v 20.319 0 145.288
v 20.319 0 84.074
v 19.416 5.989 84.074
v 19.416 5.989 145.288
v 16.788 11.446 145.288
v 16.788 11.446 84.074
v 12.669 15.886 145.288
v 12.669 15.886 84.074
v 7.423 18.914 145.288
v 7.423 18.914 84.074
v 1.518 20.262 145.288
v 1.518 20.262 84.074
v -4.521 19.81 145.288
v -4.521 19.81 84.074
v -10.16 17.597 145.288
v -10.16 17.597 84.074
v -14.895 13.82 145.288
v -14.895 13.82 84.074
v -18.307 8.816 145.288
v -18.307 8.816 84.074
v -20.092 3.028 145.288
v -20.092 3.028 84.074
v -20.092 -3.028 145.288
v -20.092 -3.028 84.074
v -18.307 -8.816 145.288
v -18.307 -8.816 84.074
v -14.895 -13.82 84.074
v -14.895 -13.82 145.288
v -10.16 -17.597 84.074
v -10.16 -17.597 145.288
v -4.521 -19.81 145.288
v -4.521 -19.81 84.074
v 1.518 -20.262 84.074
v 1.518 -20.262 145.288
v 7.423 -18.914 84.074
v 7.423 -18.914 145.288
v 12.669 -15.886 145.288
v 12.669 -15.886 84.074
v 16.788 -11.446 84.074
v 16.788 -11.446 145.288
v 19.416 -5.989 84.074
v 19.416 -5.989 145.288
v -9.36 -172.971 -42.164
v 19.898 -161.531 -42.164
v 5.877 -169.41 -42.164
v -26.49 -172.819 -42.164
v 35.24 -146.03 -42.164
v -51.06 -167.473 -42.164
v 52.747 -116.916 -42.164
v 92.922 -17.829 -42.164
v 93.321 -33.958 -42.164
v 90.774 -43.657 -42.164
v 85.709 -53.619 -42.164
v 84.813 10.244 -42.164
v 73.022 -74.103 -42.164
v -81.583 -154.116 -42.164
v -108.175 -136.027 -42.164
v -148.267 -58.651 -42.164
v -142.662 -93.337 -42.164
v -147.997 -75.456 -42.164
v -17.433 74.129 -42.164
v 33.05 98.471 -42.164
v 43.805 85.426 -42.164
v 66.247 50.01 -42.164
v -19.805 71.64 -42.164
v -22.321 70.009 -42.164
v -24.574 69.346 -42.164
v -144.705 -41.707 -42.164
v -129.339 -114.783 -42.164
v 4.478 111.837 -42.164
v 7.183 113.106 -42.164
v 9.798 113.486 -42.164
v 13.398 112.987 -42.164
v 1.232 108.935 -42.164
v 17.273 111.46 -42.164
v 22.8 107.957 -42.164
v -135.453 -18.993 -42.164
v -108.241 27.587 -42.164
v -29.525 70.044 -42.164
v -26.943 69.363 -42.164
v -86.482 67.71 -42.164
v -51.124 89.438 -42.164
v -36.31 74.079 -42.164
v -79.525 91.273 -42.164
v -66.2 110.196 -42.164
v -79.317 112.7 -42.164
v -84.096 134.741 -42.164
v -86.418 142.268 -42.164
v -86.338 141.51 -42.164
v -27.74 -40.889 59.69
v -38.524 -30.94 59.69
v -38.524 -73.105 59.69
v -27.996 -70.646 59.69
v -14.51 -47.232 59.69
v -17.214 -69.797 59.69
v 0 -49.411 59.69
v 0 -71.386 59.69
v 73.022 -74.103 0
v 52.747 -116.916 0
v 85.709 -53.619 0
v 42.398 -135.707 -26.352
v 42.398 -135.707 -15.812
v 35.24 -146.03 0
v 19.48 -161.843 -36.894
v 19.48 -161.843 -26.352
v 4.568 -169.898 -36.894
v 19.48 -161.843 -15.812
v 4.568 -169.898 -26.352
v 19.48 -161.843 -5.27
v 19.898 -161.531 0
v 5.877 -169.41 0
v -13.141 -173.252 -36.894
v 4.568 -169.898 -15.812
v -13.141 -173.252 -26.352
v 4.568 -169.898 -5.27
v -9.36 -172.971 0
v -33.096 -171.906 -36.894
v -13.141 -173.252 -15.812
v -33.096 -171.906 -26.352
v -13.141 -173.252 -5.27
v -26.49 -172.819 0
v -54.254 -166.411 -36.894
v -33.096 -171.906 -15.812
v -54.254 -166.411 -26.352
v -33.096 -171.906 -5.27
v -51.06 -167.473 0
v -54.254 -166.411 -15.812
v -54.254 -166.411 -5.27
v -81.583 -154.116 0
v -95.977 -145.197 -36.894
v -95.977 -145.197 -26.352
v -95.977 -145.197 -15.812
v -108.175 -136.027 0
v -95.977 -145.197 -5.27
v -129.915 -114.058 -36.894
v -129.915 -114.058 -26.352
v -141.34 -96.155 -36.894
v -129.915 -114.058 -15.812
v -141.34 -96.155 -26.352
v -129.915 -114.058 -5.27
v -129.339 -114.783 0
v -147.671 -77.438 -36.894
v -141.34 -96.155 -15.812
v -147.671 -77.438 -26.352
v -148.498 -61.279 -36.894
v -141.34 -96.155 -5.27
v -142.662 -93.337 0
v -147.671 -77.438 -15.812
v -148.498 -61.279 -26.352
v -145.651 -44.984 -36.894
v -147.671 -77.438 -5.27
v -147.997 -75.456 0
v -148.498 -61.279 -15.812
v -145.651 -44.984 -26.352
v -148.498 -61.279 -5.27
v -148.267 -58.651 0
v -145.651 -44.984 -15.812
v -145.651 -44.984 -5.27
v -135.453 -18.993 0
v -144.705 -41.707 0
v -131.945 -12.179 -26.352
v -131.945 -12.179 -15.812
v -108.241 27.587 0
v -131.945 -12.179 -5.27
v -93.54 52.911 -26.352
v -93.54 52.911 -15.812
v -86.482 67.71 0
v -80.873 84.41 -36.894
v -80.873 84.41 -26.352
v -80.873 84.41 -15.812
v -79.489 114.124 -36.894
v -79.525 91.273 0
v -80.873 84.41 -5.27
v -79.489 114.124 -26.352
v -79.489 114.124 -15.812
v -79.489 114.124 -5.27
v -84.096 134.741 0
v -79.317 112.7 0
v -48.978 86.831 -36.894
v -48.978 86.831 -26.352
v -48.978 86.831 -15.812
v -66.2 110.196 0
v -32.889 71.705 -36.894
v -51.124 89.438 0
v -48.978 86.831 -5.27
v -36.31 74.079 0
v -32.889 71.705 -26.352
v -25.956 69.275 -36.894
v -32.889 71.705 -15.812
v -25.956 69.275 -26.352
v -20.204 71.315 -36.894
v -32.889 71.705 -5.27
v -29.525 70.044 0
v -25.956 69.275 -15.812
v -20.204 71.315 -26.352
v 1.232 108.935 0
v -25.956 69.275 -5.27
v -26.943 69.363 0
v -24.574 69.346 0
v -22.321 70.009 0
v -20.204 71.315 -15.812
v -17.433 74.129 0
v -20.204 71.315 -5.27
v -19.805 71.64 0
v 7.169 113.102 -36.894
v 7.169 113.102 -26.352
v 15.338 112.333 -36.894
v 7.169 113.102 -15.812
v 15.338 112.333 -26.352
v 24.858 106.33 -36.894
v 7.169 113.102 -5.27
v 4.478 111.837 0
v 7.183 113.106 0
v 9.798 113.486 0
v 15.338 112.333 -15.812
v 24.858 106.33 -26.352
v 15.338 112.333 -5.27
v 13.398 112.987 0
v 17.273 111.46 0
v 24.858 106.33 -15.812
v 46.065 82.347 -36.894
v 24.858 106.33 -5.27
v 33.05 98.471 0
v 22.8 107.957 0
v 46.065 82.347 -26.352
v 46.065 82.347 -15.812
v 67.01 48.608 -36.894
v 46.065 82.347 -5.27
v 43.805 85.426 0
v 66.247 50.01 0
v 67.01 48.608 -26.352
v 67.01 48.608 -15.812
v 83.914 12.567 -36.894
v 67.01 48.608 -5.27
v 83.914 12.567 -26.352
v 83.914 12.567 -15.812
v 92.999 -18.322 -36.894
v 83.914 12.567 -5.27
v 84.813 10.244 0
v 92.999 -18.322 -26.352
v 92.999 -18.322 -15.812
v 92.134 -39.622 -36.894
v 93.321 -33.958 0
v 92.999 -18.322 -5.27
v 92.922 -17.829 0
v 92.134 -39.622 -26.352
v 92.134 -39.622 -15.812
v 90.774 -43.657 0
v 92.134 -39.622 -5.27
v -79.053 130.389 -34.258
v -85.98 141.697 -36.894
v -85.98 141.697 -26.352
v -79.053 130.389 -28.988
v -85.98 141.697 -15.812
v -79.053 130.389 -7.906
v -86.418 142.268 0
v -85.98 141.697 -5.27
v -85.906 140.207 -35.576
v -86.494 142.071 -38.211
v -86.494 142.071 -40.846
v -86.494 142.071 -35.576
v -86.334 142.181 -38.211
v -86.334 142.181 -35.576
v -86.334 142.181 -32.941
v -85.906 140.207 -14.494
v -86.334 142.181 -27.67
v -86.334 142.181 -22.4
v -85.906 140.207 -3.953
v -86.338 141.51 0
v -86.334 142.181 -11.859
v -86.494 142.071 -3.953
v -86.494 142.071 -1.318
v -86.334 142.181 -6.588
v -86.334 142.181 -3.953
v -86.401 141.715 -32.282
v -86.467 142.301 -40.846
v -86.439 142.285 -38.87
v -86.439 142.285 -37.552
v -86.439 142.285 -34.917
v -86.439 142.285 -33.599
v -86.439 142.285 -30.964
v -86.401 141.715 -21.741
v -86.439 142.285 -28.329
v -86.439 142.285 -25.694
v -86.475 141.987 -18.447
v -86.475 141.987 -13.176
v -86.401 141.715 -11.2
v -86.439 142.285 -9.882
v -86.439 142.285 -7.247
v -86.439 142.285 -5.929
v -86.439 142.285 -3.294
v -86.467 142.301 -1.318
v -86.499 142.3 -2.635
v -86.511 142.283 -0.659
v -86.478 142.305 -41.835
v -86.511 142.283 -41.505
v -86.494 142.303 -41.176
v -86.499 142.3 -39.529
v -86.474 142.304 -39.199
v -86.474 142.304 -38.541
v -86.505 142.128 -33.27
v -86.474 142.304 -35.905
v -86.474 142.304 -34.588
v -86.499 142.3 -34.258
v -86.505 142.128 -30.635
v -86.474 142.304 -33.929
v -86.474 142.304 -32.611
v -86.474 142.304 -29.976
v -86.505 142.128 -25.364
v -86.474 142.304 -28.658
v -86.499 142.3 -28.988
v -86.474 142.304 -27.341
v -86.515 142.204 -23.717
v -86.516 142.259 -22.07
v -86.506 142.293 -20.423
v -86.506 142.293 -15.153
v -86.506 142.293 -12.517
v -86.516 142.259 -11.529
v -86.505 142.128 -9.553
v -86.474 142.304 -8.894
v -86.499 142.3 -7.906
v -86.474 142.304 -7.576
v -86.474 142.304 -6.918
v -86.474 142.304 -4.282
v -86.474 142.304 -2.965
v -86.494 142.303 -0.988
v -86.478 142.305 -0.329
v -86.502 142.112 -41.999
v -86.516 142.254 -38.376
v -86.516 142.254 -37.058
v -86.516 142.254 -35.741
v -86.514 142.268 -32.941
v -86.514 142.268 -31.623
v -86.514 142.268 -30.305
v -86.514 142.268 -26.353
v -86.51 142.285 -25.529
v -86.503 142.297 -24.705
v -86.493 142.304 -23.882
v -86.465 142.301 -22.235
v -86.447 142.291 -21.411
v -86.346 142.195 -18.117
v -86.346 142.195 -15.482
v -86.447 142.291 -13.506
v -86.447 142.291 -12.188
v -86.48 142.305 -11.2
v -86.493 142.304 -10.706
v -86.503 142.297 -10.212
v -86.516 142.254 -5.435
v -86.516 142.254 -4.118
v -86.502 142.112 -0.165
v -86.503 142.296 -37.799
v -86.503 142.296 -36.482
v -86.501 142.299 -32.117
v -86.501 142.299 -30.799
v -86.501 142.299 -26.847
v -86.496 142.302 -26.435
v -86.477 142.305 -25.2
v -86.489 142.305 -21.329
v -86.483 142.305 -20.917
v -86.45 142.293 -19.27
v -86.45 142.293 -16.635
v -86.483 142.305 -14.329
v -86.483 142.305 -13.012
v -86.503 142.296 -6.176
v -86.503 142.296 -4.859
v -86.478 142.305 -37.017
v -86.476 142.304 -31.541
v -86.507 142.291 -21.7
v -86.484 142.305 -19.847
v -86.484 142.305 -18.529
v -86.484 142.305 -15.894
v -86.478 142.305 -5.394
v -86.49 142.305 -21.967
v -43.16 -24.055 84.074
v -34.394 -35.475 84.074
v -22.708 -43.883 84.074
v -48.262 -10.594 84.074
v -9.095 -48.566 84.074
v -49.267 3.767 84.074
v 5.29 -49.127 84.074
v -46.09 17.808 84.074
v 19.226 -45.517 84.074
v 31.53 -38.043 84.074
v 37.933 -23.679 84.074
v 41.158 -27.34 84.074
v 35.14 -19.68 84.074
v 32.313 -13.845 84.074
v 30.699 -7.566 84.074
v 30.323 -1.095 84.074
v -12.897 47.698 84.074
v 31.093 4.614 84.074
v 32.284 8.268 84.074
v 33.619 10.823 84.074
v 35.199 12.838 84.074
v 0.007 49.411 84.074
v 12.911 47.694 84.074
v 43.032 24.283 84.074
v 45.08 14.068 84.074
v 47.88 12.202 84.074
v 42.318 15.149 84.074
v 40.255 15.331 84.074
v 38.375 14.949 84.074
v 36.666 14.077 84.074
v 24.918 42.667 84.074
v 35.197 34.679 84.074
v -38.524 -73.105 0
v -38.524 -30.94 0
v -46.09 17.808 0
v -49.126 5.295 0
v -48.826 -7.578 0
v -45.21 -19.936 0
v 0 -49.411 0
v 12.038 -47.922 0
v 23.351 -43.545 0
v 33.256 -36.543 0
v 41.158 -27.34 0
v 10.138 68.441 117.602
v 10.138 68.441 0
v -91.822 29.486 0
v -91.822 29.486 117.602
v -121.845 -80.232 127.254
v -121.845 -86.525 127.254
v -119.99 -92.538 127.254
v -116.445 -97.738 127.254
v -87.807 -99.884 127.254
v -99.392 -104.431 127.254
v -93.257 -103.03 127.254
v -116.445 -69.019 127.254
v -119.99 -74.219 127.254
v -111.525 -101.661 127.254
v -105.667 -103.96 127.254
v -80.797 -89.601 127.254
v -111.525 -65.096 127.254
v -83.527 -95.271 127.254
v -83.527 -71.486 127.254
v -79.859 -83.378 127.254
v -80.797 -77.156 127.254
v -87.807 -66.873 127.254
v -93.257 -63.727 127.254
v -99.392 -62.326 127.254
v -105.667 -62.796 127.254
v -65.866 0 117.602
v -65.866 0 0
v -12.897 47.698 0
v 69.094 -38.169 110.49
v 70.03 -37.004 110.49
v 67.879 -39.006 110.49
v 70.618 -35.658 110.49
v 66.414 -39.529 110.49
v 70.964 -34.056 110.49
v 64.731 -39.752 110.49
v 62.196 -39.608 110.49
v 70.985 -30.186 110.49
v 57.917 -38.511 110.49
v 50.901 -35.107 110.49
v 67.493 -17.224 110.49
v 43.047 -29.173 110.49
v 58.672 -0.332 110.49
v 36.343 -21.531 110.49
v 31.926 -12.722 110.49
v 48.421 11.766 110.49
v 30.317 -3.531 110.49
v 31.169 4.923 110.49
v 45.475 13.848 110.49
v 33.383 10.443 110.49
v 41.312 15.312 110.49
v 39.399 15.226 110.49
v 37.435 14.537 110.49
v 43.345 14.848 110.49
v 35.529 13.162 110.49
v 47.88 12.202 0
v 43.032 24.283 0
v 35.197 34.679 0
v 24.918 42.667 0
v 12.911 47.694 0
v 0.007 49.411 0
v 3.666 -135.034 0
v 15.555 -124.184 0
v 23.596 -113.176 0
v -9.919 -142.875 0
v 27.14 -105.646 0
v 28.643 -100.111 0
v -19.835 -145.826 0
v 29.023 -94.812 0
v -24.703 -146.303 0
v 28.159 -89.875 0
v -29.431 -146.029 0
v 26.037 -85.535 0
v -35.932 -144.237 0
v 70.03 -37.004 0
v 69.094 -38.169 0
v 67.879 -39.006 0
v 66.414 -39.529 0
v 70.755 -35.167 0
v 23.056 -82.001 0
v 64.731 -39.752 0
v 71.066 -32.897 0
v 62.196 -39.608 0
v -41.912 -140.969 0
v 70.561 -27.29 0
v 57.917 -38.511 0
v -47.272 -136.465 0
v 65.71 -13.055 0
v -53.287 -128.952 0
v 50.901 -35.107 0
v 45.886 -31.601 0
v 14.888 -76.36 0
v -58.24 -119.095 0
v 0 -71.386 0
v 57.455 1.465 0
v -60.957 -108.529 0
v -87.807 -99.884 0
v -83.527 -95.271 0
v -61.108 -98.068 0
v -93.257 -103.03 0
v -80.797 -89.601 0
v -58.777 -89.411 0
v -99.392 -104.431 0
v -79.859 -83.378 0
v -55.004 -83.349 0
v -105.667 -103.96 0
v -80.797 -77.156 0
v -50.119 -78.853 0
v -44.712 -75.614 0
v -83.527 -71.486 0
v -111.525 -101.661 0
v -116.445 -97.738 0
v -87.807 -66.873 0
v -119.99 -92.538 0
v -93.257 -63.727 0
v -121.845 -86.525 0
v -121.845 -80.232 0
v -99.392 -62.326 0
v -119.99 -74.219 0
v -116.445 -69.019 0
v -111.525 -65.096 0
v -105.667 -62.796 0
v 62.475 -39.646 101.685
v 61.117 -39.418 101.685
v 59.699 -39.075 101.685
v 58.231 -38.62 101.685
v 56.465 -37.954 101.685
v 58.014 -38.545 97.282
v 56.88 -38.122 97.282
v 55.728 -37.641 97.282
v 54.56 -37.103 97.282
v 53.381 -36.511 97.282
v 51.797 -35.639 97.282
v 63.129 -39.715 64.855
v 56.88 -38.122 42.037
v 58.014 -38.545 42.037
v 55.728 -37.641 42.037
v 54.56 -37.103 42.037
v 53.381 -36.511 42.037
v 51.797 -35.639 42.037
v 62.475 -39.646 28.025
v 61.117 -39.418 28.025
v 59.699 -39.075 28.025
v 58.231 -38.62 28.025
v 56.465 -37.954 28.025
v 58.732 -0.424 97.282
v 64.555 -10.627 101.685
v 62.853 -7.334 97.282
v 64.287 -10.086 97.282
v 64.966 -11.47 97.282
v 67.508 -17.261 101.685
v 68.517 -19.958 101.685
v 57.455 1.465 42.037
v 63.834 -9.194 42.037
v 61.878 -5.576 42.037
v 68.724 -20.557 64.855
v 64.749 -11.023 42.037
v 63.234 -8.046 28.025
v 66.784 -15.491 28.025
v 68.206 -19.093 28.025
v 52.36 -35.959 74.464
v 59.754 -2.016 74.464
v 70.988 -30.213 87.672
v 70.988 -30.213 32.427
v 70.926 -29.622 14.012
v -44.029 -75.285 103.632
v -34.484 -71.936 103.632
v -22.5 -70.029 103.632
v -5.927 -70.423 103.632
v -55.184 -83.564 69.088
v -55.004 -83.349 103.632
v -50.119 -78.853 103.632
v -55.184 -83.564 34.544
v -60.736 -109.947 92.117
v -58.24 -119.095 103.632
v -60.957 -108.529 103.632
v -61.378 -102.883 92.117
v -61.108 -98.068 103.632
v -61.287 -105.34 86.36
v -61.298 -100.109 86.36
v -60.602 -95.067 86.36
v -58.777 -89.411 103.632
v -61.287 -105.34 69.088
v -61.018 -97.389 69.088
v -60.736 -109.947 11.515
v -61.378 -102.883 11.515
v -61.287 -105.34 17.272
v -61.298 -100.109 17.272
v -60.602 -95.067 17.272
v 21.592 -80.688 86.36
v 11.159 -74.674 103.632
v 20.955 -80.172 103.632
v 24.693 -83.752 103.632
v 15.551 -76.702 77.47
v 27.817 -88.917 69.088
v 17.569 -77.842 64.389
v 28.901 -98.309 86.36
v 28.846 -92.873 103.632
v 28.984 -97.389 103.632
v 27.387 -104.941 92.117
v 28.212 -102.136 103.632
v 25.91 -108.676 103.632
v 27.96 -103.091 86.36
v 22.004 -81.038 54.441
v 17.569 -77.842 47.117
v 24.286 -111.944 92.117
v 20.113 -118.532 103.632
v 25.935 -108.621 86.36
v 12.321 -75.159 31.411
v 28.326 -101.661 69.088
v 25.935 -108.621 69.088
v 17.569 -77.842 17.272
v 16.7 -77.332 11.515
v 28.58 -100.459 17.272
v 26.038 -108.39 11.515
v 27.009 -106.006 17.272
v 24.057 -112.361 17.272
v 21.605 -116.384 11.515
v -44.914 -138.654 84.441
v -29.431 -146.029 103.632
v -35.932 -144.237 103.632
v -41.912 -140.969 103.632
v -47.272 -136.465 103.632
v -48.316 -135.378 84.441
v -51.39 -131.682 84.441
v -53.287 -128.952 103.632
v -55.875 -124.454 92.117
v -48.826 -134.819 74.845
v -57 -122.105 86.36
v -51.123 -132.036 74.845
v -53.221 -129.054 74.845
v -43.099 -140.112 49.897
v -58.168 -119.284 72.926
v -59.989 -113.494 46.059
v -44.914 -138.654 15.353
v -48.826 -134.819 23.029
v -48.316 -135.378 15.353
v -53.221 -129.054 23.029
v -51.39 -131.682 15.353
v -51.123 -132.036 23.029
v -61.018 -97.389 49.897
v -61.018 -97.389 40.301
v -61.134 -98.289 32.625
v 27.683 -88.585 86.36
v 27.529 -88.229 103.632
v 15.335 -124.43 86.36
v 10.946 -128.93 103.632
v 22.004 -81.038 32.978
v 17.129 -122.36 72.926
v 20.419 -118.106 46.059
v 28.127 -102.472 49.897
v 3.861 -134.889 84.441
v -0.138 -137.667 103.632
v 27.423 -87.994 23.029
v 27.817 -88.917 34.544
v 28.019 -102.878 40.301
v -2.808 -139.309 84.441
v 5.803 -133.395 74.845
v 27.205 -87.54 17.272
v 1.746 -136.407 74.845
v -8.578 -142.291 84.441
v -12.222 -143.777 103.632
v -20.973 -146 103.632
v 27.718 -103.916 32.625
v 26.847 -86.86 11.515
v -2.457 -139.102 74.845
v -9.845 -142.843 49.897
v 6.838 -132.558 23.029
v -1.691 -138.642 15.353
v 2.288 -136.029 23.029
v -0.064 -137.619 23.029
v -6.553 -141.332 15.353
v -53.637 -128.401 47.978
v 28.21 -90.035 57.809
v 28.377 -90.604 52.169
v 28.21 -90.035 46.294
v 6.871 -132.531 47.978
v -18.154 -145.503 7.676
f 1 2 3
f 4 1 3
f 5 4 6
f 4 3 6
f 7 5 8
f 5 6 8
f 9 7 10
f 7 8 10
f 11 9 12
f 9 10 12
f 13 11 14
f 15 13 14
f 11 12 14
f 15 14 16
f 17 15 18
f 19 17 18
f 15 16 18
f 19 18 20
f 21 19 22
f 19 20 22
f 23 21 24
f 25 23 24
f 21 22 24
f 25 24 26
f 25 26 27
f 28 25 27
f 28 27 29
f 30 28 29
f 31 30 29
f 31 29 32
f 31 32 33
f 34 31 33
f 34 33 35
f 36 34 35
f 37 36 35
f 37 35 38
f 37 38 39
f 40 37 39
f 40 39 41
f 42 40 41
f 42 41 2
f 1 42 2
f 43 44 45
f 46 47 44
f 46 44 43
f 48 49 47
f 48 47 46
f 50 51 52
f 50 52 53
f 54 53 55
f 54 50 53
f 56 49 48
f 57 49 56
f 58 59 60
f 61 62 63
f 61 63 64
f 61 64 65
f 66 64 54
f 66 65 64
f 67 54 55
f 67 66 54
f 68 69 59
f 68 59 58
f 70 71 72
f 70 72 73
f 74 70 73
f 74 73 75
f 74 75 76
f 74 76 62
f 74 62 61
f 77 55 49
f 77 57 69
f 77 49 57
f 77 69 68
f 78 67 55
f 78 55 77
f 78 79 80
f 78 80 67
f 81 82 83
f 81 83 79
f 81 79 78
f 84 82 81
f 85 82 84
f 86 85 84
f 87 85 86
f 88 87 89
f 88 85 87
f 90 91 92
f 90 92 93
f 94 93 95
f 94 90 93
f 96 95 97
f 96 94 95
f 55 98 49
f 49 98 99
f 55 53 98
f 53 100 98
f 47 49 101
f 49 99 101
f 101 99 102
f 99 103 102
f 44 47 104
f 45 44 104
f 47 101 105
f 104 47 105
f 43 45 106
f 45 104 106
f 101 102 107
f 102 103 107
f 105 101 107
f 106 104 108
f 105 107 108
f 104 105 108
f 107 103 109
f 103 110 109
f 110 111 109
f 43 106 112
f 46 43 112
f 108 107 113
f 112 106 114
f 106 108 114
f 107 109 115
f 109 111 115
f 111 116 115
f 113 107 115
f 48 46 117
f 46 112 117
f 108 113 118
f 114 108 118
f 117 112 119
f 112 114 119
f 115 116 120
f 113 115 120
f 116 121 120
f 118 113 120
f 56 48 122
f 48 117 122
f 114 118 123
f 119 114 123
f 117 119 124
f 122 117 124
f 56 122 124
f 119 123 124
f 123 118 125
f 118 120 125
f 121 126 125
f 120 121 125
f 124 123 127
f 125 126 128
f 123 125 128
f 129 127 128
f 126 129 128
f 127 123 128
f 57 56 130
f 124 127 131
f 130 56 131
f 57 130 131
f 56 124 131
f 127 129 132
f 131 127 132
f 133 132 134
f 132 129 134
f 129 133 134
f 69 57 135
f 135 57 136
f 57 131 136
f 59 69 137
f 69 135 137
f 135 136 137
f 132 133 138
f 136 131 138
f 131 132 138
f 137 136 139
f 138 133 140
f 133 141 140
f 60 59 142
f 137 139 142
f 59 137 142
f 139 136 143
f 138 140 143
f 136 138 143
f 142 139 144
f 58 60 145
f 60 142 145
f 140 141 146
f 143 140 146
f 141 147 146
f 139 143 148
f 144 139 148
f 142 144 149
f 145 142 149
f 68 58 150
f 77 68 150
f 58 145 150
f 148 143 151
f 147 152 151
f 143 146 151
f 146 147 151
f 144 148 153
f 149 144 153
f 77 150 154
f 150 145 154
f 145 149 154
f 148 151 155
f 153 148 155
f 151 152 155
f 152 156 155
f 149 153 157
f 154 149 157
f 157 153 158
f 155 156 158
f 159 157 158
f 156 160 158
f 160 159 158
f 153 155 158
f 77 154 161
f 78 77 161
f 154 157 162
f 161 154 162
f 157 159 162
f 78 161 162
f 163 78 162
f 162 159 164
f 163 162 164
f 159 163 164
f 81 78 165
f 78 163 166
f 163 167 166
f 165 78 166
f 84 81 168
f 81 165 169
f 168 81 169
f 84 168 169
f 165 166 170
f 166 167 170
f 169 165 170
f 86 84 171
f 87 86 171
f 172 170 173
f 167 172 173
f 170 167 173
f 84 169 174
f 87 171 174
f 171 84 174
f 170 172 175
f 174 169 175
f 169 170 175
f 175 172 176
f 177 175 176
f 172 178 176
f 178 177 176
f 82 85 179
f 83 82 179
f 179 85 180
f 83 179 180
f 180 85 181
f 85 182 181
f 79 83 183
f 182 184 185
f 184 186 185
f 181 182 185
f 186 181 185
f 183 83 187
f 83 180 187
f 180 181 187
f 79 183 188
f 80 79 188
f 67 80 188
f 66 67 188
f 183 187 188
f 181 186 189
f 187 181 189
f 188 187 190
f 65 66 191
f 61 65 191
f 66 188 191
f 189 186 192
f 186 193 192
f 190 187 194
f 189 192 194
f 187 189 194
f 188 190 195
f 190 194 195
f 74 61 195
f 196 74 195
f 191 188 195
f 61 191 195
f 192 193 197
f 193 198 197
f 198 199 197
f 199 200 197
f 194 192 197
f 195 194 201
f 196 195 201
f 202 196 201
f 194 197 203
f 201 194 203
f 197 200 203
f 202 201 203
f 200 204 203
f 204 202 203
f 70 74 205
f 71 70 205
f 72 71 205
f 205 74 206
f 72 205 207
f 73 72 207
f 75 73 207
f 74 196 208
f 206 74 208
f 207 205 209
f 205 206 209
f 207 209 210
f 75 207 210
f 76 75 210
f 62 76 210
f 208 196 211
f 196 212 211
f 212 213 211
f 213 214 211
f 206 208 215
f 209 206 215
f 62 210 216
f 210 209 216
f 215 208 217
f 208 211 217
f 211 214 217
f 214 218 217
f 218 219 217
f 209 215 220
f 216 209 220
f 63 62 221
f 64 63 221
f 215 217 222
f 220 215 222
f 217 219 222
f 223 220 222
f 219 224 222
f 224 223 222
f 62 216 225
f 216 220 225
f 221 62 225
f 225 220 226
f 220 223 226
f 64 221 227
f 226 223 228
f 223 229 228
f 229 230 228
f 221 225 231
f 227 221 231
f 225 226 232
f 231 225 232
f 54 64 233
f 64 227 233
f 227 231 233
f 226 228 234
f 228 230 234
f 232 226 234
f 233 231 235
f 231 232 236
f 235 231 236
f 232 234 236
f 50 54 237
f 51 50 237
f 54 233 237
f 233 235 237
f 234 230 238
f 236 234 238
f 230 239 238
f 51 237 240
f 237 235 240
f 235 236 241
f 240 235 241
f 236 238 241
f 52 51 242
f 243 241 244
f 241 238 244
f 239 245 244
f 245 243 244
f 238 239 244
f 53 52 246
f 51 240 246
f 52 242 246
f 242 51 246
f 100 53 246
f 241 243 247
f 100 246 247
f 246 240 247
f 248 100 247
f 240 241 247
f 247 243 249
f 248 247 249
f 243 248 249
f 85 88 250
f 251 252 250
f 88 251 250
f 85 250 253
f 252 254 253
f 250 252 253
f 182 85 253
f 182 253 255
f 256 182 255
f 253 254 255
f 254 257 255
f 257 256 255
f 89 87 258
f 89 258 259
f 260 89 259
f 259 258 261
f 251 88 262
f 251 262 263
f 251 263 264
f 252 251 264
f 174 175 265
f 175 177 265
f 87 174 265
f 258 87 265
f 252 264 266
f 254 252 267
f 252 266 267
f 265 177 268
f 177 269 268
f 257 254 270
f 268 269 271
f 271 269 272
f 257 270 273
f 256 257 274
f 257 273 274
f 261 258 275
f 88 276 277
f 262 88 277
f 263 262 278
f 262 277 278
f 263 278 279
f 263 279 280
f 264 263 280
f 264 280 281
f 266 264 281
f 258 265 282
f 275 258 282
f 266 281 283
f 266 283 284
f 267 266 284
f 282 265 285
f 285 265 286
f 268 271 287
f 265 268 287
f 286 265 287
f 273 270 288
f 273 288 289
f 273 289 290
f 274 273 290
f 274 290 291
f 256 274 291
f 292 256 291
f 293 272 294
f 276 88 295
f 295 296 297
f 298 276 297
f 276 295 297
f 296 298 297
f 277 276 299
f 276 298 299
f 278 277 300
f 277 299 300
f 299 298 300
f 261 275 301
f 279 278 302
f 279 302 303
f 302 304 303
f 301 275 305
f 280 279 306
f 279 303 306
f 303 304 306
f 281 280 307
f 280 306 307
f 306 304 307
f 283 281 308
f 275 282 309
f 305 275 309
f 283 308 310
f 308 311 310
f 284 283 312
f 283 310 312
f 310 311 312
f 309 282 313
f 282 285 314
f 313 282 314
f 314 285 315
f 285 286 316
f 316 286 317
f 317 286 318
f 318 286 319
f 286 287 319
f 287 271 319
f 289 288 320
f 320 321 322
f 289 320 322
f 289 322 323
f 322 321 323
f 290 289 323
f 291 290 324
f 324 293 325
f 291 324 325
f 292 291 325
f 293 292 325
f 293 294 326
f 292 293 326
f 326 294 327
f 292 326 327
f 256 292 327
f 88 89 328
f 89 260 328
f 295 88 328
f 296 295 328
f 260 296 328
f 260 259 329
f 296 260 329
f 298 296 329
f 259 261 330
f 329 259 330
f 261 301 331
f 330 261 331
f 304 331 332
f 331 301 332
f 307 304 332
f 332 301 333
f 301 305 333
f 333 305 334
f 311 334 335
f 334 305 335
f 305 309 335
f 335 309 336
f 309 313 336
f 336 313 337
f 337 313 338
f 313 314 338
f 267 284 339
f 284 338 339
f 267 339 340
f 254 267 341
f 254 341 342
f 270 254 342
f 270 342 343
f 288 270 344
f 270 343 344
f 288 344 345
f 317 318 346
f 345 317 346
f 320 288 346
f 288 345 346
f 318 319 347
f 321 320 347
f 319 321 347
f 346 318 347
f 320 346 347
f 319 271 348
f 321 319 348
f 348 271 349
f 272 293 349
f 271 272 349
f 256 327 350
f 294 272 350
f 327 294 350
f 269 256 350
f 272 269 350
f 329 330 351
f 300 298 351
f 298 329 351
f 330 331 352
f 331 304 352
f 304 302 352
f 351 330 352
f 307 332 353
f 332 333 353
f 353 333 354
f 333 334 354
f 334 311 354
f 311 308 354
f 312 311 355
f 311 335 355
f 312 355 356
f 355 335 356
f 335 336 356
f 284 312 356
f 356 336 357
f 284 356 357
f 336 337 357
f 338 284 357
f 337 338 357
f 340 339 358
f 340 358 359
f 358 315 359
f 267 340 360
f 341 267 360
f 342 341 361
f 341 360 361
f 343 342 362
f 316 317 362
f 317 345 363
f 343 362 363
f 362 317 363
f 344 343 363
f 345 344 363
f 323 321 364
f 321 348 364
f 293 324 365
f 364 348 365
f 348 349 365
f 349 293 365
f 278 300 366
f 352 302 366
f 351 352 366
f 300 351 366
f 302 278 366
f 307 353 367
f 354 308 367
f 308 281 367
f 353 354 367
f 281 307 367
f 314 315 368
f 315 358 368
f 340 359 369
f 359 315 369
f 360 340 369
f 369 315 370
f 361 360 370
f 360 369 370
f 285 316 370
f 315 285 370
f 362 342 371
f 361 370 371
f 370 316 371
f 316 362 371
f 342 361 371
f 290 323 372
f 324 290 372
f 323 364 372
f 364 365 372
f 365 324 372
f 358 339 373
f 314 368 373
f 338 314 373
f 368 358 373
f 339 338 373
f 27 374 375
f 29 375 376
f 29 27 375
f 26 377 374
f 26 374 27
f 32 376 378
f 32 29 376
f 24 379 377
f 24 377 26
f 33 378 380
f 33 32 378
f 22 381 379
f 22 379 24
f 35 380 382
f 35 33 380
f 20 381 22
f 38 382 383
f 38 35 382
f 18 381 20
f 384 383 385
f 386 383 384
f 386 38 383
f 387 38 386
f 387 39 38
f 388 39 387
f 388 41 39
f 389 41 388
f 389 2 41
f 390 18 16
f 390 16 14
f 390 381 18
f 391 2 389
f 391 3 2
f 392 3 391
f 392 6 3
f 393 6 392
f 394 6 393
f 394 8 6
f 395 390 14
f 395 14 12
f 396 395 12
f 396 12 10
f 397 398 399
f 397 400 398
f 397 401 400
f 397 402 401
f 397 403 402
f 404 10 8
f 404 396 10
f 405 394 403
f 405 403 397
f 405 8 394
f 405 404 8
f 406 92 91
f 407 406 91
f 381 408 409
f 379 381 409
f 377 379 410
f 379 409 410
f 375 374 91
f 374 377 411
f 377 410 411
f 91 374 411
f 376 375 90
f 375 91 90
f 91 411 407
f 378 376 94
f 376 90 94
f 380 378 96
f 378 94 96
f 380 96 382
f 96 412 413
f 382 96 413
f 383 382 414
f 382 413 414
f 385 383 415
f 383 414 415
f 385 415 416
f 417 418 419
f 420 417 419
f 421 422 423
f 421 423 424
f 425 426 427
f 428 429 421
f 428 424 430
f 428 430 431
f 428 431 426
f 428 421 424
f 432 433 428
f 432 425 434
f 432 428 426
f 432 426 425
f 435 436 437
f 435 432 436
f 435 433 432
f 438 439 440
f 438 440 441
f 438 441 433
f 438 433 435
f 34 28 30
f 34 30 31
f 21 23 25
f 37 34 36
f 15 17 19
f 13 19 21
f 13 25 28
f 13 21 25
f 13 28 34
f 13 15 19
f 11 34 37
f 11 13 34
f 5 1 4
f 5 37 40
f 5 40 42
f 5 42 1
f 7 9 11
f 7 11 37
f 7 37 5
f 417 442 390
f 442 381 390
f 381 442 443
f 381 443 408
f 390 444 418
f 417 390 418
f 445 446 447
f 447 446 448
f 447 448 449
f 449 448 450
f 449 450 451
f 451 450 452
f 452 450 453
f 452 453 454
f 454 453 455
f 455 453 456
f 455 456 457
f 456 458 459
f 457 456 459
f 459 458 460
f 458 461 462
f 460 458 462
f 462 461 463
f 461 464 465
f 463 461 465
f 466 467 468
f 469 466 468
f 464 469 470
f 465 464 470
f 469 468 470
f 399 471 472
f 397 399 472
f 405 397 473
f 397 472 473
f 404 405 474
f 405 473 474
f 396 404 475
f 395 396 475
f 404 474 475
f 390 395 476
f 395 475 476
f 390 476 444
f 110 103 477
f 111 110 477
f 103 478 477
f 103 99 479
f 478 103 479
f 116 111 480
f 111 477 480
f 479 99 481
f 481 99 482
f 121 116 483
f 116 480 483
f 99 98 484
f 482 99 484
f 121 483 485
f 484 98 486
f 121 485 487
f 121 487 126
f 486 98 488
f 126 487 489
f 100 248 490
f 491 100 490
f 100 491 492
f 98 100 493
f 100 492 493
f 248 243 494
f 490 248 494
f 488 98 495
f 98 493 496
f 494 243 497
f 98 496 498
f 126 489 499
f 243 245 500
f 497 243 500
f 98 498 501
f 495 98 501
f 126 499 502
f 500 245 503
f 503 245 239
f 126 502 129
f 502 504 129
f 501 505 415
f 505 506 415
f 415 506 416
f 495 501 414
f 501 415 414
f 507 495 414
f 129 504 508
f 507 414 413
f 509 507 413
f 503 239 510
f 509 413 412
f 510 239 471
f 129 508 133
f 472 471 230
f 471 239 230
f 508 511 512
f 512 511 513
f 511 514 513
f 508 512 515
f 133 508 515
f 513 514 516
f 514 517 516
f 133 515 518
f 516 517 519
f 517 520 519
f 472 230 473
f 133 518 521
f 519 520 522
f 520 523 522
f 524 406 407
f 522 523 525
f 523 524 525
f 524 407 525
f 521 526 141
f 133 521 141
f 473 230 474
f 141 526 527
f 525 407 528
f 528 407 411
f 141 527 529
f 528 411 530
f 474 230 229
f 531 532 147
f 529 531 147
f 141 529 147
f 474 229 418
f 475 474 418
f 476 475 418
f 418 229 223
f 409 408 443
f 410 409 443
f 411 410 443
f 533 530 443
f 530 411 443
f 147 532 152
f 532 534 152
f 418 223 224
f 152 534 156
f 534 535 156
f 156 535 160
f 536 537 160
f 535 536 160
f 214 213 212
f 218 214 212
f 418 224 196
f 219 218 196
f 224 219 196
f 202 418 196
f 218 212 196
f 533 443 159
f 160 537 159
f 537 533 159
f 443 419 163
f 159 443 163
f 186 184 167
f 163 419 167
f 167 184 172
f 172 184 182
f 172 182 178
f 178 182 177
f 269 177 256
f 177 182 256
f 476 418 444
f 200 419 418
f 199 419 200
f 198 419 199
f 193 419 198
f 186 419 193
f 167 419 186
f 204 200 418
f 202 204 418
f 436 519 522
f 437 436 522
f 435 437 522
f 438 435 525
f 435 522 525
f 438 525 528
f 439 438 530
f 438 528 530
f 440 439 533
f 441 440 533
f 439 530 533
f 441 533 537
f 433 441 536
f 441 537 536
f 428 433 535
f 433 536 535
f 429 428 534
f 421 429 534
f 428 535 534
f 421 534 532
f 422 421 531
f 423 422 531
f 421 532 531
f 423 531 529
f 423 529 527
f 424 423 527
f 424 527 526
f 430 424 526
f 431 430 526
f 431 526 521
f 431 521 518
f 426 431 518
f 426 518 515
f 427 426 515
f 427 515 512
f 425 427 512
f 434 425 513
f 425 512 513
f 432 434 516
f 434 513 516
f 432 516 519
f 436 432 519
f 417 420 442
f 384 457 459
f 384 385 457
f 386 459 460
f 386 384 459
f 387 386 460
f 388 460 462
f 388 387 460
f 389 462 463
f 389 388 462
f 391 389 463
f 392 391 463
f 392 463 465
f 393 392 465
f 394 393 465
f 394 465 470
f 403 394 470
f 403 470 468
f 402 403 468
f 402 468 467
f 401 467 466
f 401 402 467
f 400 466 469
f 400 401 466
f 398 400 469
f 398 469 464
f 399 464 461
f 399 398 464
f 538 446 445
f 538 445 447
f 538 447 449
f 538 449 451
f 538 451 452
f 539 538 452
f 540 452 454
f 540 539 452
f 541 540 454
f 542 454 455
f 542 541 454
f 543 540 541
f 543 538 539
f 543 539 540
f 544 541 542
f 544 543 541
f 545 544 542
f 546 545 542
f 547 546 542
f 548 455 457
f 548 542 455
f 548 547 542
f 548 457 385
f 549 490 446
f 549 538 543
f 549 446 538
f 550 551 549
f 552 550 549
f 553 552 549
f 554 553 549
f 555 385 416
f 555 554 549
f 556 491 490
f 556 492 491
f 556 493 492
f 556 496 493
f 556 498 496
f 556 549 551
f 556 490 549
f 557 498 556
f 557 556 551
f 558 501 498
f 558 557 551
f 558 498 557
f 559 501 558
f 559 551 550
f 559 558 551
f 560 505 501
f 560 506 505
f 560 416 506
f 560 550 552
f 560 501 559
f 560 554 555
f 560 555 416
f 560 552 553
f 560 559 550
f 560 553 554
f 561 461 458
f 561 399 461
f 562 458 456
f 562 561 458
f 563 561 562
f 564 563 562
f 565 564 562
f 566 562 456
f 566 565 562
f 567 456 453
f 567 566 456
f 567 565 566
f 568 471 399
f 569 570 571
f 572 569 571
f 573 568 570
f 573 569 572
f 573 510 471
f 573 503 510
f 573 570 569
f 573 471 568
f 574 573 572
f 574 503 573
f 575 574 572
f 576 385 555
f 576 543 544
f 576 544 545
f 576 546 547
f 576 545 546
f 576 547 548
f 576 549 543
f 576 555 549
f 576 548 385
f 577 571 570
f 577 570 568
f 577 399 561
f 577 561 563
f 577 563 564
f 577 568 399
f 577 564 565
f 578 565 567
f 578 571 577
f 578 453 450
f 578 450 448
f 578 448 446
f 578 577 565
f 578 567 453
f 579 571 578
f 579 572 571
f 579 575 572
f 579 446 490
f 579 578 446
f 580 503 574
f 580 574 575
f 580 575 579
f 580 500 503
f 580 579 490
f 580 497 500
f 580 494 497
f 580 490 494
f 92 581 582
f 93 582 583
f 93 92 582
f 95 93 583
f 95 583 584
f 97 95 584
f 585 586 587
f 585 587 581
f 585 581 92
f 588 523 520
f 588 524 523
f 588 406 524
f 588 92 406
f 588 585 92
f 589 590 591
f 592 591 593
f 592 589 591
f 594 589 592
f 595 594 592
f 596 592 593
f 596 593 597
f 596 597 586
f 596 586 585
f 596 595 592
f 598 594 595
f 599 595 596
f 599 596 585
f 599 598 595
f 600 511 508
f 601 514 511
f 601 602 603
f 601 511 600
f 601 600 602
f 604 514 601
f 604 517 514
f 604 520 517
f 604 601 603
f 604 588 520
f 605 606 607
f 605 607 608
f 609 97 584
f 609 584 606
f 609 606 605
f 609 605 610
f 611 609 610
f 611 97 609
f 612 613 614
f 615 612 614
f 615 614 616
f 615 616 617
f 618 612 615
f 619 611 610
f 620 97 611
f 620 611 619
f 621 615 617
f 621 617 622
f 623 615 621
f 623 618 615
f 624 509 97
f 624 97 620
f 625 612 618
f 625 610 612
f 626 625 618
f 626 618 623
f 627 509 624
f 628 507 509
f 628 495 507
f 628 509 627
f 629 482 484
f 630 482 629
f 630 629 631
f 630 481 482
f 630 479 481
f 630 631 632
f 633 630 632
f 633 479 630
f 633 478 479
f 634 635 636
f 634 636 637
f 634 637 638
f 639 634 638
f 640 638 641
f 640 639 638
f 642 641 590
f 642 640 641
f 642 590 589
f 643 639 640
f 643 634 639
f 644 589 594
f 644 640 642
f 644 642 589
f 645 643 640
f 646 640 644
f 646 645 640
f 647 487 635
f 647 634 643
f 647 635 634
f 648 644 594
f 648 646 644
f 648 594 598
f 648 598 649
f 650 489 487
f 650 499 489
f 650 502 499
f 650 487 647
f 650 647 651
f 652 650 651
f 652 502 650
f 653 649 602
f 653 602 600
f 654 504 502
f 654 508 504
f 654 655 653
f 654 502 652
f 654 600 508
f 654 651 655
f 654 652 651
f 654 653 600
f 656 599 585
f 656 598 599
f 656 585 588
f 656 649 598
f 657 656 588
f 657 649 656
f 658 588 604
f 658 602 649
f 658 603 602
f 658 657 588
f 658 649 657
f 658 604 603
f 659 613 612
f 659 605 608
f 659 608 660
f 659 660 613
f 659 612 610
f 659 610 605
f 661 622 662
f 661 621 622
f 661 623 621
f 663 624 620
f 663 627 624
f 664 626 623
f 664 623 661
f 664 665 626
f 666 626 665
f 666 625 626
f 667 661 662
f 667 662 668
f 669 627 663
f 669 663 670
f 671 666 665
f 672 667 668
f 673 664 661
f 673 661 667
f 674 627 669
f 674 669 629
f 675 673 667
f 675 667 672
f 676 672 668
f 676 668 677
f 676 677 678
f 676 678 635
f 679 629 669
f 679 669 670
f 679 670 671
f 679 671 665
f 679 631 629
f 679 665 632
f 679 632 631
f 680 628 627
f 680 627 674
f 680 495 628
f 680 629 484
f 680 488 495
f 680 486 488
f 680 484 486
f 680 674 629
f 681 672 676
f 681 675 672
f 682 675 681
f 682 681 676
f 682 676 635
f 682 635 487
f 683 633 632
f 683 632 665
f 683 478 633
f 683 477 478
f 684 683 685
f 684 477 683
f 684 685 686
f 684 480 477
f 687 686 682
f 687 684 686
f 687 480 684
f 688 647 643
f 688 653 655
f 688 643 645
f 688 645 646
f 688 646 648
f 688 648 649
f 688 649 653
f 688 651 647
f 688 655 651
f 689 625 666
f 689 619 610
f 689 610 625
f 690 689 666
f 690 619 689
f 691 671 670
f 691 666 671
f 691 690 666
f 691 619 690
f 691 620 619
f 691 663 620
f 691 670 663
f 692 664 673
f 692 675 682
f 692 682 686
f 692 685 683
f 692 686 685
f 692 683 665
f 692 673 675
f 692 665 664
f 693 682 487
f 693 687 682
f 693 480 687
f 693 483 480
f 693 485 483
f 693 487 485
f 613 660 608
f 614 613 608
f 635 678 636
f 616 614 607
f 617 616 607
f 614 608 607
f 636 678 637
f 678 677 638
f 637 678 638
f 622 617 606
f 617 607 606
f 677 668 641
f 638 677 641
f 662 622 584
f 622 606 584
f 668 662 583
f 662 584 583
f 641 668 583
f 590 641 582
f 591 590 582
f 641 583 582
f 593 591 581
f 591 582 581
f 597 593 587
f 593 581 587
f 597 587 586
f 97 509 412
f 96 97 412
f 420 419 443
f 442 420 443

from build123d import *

# Parameters (mm, degrees)
F1_DEPTH  = 42.164
F2_W      = 38.5241918266
F2_H      = 127.3398250341
F3_DEPTH  = 59.69
F5_DEPTH  = 110.49
F6_R      = 21.1112099369
F7_DEPTH  = 127.254
F8_R      = 20.3190246202
F9_DEPTH  = 145.288
F11_DEPTH = 103.632
F13_DEPTH = 117.602
F14_R     = 49.4106049206
F15_DEPTH = 84.074


with BuildPart() as f1:
    # F0 (on Top) → F1 (new body)
    with BuildSketch(Plane.XY):
        with BuildLine():
            add(Edge.make_bspline(
                [(73.0219110847, -74.1029083729), (56.3103769833, -104.5552977689), (23.6058214348, -227.5197938922), (-227.6389689023, -79.5455249771), (-49.3392070816, 69.8421969004), (-108.2327801079, 182.9374174128), (-16.163777477, 18.2847889977), (-0.491220386, 174.7950672476), (118.0380933666, -29.7226842084), (84.8996382345, -52.4588647972), (73.0219110847, -74.1029083729)],
                knots=[0, 0, 0, 0, 0.1341068342, 0.2949926086, 0.459518833, 0.5453522264, 0.6635342284, 0.7534064499, 0.9046835332, 1, 1, 1, 1], degree=3))
        make_face()
    extrude(amount=-F1_DEPTH)

    # F2 (on Top) → F3 (join)
    with BuildSketch(Plane.XY):
        with Locations((-19.2620959133, -63.6699125171)):
            Rectangle(F2_W, F2_H)
    extrude(amount=F3_DEPTH)

    # F4 (on Top) → F5 (join)
    with BuildSketch(Plane.XY):
        with BuildLine():
            add(Edge.make_bspline(
                [(70.0295418501, -37.003710866), (64.9955145523, -45.542062589), (19.8707773949, -22.1192495036), (40.0389015381, 41.8701568269), (75.9834949815, -26.905047714), (70.0295418501, -37.003710866)],
                knots=[0, 0, 0, 0, 0.3269025935, 0.6133587275, 1, 1, 1, 1], degree=3))
        make_face()
    extrude(amount=F5_DEPTH)

    # F6 (on Top) → F7 (join)
    with BuildSketch(Plane.XY):
        with Locations((-100.9698063135, -83.3783745766)):
            Circle(F6_R)
    extrude(amount=F7_DEPTH)

    # F8 (on Top) → F9 (join)
    with BuildSketch(Plane.XY):
        Circle(F8_R)
    extrude(amount=F9_DEPTH)

    # F10 (on Top) → F11 (join)
    with BuildSketch(Plane.XY):
        with BuildLine():
            add(Edge.make_bspline(
                [(-29.430905357, -146.0287123919), (-54.6330226066, -142.3830478337), (-88.9750749471, -58.5173988284), (75.1826600594, -71.0009478728), (-1.8596938378, -150.0170831968), (-29.430905357, -146.0287123919)],
                knots=[0, 0, 0, 0, 0.3121569838, 0.6584990799, 1, 1, 1, 1], degree=3))
        make_face()
    extrude(amount=F11_DEPTH)

    # F12 (on Top) → F13 (join)
    with BuildSketch(Plane.XY):
        Polygon((10.1382983848, 68.4409886599), (-91.8220505118, 29.4863004237), (-65.8660754561, 0), align=None)
    extrude(amount=F13_DEPTH)

    # F14 (on face) → F15 (join)
    with BuildSketch(Plane.XY):
        Circle(F14_R)
    extrude(amount=F15_DEPTH)


solid = f1.part
